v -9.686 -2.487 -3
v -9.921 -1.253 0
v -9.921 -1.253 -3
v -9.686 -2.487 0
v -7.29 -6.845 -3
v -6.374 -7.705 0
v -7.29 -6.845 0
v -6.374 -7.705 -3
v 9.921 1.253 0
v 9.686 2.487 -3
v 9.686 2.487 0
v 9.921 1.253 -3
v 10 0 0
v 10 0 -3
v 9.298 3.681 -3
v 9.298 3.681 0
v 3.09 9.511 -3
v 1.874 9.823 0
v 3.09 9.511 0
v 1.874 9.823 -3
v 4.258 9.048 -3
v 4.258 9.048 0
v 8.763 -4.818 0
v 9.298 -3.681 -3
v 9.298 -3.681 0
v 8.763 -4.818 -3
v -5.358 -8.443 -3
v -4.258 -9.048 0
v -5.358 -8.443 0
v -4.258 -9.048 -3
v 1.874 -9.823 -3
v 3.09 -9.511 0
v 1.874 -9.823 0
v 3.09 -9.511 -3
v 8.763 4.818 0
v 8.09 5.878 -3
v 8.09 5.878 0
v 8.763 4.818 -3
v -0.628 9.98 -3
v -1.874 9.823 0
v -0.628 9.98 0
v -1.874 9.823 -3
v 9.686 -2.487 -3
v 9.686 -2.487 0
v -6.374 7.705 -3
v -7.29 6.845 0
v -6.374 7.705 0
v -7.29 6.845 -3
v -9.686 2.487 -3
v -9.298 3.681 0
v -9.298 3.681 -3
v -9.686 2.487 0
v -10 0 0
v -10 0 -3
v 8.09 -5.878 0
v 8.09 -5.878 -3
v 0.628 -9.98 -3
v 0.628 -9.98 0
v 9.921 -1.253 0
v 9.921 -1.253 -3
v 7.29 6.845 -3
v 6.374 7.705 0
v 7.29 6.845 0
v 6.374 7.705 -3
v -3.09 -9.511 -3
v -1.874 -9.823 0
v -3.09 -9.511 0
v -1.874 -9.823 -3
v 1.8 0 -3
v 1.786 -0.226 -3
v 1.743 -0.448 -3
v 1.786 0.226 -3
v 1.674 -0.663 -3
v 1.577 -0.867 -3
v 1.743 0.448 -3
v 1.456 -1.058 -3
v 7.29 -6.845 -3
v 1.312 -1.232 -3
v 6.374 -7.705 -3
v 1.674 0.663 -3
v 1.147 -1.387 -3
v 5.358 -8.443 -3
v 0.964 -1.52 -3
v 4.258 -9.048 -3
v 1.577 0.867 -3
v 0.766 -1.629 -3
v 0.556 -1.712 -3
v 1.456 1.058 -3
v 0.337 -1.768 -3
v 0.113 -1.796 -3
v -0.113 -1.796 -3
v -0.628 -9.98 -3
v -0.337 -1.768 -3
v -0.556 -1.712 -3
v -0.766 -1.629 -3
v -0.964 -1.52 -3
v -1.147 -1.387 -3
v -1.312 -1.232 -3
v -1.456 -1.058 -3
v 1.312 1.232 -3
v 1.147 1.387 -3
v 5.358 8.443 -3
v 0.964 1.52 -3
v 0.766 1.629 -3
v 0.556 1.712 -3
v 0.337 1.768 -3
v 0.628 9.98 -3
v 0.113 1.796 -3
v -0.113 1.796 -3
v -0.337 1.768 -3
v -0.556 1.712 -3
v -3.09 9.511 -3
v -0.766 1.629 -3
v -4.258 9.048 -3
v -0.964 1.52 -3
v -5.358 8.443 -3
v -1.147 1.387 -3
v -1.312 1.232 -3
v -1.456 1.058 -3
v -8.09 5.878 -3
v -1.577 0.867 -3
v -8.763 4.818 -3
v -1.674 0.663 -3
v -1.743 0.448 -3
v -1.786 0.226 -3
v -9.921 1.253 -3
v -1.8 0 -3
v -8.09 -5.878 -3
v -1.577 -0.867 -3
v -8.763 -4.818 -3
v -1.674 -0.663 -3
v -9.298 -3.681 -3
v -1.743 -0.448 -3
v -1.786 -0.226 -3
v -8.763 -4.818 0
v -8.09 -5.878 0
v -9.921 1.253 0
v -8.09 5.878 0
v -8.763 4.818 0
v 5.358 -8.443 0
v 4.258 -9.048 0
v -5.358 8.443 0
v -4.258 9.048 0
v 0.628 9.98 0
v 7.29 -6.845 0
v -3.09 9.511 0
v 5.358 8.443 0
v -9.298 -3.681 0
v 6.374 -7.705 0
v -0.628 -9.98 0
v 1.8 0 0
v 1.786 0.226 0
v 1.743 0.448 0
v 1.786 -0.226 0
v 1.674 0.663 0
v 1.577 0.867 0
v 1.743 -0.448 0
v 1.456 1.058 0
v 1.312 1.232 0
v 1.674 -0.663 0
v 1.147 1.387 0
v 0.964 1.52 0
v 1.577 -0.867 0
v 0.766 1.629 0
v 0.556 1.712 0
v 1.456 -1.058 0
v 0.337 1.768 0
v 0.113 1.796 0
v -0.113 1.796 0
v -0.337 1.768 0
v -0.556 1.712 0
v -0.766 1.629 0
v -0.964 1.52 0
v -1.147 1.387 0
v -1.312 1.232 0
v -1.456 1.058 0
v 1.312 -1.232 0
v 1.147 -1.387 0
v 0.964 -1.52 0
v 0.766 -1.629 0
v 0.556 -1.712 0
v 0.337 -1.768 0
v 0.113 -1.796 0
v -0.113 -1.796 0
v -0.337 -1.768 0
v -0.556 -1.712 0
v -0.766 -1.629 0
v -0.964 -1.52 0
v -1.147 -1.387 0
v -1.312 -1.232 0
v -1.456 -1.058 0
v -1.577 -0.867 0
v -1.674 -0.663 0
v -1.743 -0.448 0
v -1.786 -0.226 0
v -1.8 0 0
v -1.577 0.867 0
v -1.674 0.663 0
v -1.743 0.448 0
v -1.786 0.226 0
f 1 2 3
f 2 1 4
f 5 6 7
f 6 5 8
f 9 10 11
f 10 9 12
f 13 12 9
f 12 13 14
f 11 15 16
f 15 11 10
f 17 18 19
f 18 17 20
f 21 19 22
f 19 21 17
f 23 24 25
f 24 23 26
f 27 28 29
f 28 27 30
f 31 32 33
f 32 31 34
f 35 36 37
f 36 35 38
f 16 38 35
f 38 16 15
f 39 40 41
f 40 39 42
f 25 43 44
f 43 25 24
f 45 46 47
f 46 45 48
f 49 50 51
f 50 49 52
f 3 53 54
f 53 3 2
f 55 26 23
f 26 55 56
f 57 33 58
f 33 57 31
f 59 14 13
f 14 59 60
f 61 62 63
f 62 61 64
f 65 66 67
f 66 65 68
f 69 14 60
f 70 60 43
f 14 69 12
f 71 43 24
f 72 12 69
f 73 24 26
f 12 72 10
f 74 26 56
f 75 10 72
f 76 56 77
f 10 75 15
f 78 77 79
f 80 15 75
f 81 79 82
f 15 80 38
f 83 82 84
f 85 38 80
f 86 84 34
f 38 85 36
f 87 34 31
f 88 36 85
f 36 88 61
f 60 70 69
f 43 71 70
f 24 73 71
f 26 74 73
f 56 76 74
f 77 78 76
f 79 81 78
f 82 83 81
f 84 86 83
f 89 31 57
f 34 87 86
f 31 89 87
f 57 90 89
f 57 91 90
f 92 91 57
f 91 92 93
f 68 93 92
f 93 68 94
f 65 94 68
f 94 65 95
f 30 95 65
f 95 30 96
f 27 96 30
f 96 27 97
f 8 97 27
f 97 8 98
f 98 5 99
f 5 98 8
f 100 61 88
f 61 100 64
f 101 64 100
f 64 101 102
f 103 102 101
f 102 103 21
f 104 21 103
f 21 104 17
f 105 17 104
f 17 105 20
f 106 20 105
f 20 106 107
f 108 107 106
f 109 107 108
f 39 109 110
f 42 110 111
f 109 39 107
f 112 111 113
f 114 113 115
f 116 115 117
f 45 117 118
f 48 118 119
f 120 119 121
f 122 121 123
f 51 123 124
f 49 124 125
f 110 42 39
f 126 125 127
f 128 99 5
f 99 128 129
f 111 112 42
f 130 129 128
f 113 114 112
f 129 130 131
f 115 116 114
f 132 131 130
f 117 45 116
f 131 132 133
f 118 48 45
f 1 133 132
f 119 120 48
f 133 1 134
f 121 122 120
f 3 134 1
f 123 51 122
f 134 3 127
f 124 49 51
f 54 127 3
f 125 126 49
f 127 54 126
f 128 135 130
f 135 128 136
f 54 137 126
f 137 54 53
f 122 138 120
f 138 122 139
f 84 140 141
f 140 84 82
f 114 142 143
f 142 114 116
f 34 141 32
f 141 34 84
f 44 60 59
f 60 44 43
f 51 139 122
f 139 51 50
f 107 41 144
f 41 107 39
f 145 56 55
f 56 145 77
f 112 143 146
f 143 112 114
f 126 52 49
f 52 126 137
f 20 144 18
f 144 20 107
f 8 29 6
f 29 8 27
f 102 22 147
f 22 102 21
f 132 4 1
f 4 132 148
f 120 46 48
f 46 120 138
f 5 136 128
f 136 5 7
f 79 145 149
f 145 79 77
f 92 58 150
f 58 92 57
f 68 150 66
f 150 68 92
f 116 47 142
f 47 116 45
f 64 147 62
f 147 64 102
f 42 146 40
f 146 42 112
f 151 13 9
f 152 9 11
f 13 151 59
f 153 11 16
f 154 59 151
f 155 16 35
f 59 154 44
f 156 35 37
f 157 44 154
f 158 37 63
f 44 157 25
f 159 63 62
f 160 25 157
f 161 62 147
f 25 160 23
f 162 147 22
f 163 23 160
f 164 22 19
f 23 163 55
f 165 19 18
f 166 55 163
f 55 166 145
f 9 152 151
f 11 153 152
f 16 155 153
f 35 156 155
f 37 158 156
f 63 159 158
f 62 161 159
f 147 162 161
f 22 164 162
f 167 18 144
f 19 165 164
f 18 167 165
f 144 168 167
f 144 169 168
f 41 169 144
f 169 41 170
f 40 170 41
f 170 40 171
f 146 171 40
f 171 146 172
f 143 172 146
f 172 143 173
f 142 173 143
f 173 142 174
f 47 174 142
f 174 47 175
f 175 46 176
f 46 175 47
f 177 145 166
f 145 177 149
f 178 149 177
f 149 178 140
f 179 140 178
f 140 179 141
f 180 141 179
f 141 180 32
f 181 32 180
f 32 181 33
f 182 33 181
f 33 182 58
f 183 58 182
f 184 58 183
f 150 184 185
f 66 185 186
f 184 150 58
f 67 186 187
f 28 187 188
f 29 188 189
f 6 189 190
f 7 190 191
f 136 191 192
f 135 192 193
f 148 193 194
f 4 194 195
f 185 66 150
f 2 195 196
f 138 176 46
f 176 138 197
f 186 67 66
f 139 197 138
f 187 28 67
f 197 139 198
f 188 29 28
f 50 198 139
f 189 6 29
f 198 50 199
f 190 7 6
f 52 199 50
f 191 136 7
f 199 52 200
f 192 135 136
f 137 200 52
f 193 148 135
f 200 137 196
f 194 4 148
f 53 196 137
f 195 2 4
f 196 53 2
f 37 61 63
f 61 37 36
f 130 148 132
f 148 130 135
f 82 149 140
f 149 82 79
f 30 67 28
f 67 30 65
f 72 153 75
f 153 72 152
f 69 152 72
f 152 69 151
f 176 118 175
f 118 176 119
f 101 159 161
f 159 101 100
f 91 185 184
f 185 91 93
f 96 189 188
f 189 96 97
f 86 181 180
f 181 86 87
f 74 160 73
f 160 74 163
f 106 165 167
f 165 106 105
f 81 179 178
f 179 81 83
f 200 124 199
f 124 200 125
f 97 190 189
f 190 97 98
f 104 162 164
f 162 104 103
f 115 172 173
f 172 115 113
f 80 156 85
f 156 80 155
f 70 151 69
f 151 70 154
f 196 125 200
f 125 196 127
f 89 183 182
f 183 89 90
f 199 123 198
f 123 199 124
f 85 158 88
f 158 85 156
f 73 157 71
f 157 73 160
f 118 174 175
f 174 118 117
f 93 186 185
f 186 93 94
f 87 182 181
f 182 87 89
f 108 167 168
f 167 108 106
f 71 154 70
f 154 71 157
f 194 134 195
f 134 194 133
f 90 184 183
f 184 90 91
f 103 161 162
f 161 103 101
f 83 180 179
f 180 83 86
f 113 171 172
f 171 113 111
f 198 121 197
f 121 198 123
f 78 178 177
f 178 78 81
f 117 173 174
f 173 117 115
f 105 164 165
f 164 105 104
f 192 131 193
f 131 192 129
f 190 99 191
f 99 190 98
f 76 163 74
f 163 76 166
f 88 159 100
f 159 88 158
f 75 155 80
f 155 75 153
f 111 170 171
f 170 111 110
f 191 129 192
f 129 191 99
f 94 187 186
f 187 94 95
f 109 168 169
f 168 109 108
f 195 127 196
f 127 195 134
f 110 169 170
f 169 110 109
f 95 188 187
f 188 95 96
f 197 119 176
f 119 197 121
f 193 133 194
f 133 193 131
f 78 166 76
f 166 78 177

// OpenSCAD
$fn = 50;


difference() {
	union() {
		translate(v = [0, 0, -3.0000000000]) {
			cylinder(h = 3, r = 10.0000000000);
		}
		cylinder(h = 0, r = 13.0000000000);
	}
	union() {
		#translate(v = [0, 0, -3]) {
			cylinder(h = 3, r = 1.8000000000);
		}
	}
}
